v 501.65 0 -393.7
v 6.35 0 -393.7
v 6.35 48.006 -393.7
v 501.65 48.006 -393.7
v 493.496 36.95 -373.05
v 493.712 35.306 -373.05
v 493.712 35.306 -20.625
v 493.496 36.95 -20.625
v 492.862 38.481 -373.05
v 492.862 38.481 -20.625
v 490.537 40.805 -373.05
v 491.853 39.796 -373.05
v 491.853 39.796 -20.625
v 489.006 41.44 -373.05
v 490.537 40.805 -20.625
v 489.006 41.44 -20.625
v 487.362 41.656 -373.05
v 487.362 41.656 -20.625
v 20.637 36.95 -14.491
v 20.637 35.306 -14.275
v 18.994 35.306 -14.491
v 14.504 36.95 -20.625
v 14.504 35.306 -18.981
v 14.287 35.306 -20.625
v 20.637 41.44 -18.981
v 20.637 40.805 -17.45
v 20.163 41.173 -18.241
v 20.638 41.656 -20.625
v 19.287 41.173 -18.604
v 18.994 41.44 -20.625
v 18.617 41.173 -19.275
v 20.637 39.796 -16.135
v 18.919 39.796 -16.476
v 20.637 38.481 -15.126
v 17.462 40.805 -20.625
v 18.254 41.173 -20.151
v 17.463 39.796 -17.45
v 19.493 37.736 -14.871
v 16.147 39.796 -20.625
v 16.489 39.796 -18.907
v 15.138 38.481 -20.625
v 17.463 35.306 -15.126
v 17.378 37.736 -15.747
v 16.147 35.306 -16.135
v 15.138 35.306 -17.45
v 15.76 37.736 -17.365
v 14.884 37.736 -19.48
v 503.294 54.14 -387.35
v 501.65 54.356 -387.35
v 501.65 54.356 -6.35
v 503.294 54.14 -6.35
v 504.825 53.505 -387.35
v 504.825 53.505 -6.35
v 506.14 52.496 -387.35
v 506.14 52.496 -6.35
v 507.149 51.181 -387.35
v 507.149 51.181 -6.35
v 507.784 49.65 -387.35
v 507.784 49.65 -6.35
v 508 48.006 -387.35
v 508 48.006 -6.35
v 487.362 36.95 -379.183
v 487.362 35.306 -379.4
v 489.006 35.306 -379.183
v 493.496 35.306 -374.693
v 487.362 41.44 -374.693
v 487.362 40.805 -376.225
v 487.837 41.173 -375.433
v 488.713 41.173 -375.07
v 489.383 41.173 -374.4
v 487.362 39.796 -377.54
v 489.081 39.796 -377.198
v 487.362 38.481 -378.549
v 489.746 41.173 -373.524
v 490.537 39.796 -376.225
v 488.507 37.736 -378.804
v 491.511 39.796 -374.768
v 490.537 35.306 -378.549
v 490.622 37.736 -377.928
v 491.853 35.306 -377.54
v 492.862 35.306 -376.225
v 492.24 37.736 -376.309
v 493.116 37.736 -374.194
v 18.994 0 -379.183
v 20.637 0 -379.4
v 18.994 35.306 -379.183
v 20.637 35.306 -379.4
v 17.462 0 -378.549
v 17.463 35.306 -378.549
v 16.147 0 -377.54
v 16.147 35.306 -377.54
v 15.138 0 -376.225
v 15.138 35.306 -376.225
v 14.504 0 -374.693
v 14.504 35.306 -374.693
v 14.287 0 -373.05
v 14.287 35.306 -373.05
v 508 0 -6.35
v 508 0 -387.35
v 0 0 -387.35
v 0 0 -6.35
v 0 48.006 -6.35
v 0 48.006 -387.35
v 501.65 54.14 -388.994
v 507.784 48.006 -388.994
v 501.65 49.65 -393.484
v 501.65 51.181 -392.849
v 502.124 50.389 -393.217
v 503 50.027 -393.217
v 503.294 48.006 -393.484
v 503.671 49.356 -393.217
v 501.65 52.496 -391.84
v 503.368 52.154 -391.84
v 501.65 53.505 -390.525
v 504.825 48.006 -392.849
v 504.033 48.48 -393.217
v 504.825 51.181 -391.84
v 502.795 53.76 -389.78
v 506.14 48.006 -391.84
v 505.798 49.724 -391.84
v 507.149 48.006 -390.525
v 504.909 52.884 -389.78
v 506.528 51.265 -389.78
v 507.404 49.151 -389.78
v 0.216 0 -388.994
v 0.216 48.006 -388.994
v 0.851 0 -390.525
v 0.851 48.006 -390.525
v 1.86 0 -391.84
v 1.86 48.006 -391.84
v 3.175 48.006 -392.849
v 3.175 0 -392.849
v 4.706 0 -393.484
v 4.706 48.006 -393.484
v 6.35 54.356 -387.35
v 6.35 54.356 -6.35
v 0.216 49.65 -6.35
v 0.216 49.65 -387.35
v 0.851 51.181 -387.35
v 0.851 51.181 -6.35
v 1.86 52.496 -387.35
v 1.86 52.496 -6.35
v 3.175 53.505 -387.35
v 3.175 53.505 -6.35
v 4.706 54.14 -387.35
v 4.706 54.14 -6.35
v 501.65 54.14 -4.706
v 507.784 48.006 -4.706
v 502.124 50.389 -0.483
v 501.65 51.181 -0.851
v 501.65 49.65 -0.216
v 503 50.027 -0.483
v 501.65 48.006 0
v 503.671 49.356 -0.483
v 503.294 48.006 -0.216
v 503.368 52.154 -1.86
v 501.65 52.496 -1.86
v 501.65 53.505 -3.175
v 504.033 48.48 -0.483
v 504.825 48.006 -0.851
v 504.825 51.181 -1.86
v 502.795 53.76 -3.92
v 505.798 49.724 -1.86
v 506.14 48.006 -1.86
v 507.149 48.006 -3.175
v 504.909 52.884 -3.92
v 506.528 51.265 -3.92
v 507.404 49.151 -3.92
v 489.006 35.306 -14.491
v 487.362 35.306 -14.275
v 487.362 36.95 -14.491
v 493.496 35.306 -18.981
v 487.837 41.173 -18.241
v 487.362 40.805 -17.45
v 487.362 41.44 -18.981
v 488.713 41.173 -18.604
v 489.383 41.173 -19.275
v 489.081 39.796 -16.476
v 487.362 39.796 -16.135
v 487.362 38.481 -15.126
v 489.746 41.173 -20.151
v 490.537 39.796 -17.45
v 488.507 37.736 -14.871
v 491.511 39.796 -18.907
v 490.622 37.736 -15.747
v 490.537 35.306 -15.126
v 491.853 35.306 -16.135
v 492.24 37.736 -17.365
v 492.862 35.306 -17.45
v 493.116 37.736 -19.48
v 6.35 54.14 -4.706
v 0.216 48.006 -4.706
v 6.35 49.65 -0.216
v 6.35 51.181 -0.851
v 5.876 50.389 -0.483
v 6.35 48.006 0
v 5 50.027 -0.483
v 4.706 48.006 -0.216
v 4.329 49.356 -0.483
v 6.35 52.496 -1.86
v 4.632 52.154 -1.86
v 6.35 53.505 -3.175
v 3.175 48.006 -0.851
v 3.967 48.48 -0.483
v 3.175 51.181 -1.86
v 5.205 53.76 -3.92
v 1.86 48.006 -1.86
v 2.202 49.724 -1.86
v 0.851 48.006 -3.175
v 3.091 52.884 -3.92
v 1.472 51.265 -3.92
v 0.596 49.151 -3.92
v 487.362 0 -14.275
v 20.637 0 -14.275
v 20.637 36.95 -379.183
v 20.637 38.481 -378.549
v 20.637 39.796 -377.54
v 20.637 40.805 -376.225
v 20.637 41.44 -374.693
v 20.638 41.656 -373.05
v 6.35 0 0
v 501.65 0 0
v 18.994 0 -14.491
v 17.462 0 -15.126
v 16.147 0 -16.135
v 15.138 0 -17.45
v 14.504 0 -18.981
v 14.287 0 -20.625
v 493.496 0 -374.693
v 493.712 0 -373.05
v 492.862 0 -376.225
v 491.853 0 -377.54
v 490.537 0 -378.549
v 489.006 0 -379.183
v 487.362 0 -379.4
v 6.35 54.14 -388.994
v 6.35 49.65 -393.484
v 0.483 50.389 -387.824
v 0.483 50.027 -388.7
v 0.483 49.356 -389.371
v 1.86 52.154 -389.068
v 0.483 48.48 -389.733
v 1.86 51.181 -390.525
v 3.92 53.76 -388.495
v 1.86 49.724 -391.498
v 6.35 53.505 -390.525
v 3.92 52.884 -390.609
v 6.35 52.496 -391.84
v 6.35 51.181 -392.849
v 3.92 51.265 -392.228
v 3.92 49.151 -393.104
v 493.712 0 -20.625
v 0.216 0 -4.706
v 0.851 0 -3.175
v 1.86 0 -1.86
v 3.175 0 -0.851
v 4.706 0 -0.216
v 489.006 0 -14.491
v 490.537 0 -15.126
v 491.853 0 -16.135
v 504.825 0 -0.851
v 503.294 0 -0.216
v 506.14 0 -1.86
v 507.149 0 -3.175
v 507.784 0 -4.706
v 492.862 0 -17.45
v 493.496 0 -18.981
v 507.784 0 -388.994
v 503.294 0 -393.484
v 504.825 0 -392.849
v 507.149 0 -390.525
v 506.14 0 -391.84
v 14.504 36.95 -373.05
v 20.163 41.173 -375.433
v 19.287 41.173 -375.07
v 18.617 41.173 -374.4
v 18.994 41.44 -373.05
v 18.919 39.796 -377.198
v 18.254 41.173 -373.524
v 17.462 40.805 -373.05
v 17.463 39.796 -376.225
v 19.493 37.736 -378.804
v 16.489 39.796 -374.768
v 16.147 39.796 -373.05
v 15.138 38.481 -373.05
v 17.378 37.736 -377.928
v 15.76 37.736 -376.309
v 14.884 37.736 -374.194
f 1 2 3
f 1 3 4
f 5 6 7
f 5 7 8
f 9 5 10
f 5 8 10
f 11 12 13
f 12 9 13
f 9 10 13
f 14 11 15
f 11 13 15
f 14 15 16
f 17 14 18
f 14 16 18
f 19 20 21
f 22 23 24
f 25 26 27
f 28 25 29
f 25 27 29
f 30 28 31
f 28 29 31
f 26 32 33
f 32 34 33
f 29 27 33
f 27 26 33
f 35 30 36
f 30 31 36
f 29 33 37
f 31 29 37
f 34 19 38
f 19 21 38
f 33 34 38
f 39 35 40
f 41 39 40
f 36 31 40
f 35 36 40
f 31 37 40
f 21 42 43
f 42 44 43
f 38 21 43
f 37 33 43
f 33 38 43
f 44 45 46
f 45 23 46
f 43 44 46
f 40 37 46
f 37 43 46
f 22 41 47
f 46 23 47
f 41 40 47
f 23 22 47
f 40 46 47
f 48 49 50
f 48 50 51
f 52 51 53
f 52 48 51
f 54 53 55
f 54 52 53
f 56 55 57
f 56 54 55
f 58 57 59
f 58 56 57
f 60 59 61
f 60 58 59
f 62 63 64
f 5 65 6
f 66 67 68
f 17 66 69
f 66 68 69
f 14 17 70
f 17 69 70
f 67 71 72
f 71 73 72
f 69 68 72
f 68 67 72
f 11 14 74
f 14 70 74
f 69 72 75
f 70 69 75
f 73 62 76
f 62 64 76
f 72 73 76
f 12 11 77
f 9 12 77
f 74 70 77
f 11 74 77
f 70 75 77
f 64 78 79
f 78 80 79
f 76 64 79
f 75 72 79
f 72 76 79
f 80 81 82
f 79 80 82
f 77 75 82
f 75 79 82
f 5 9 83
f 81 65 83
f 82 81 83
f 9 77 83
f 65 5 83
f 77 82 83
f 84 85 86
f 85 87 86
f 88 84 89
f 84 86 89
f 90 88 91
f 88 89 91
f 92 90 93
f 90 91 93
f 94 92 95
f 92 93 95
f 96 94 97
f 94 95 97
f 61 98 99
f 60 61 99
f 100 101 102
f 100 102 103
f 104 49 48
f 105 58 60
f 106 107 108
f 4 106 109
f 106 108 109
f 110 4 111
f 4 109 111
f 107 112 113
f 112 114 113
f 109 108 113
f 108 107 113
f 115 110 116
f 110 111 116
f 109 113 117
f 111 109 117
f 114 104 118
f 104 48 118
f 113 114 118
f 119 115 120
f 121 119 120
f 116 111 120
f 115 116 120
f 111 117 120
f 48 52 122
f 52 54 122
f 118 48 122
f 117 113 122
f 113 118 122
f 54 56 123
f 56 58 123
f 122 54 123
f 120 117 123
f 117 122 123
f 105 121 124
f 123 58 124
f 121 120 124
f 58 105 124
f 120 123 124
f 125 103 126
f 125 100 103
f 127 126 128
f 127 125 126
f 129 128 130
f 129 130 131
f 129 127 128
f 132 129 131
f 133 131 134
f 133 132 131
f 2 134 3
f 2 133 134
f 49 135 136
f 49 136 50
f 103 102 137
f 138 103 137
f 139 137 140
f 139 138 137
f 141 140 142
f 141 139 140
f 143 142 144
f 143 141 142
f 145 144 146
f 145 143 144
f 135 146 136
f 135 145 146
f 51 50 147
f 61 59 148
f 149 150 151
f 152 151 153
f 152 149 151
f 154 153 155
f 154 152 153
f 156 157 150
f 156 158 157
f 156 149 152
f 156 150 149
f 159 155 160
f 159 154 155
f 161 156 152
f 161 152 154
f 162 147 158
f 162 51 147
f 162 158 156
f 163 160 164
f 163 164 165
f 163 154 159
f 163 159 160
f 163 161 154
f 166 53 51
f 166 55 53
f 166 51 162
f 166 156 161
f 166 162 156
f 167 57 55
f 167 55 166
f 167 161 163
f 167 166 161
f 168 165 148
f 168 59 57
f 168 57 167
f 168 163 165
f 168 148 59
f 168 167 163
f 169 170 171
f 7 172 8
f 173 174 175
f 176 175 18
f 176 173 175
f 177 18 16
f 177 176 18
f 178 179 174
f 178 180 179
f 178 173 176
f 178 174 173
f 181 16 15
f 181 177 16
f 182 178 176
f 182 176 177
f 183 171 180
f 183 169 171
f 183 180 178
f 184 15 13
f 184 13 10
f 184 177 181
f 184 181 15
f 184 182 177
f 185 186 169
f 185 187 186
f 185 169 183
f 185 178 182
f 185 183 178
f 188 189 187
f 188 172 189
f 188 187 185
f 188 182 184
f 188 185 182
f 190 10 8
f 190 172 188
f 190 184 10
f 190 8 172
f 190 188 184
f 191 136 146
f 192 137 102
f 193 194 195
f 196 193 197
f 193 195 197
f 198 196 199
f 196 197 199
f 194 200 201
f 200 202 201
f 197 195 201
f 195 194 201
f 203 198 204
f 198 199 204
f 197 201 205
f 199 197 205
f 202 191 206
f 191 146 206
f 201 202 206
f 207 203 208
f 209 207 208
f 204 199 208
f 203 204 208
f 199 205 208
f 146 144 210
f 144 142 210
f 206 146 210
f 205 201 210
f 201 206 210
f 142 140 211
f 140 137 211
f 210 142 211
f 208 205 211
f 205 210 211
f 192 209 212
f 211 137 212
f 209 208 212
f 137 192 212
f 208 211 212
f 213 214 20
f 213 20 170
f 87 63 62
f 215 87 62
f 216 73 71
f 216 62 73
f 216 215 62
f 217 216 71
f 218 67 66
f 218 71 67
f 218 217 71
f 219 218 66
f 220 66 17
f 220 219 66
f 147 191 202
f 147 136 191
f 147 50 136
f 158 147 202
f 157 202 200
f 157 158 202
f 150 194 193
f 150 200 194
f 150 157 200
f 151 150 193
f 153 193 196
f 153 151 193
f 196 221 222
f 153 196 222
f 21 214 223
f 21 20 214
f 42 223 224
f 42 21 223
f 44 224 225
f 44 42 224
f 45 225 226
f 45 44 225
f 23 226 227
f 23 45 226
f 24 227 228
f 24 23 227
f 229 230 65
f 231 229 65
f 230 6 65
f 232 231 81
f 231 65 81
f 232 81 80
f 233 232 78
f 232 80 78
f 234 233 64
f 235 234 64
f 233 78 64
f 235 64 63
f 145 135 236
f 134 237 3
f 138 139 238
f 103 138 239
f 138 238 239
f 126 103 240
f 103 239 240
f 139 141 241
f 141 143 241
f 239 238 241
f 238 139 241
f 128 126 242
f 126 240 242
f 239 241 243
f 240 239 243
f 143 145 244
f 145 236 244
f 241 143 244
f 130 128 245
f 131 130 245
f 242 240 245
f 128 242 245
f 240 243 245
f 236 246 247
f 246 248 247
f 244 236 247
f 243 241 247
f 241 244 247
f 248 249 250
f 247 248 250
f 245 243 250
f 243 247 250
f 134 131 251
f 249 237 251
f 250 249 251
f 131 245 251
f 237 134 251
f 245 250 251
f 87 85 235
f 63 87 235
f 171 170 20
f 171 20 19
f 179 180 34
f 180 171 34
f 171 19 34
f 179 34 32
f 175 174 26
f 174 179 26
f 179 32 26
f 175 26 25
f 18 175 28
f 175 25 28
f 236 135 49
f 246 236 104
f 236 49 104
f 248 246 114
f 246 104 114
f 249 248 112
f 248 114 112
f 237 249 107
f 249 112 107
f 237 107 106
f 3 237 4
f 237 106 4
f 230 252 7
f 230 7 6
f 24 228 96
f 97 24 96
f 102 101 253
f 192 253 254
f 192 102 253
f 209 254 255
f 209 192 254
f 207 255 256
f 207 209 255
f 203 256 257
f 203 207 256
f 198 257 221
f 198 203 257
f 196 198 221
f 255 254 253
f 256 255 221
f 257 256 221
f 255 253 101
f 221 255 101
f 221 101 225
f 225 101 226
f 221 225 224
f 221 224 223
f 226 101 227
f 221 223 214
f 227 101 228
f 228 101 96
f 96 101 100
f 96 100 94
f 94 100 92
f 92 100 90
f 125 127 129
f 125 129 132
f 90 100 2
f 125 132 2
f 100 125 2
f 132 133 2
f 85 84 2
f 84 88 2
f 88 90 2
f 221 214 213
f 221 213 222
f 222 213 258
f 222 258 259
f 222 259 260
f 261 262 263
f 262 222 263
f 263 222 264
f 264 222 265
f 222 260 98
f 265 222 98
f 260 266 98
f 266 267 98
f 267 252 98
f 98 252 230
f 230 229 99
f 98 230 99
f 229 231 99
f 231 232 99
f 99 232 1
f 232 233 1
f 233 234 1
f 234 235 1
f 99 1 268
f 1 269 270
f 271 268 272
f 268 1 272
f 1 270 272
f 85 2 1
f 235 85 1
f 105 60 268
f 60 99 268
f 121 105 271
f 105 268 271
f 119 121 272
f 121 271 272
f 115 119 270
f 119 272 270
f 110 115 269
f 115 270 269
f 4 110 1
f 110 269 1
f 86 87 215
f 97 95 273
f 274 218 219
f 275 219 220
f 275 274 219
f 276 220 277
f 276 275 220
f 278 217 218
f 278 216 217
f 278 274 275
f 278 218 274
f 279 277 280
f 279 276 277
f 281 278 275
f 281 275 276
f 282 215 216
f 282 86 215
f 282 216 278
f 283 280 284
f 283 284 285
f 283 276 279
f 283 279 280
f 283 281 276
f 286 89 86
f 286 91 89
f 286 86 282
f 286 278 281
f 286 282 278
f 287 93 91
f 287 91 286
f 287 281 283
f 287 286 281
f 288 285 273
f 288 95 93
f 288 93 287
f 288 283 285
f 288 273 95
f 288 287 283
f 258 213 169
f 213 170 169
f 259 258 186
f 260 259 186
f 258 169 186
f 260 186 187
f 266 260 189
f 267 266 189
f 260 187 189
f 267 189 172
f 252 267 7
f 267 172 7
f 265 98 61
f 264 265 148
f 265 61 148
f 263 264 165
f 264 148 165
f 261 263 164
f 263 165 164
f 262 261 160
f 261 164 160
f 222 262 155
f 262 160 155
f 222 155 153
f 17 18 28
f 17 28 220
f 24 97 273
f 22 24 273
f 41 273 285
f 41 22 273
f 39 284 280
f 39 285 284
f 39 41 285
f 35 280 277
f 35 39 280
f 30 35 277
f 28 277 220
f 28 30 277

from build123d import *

# Parameters (mm, degrees)
SKETCH1_W           = 508
SKETCH1_H           = 393.7
SKETCH1_W_2         = 479.425
SKETCH1_H_2         = 365.125
BOSS_EXTRUDE1_DEPTH = 54.356
SKETCH2_W           = 393.7
SKETCH2_H           = 12.7
BOSS_EXTRUDE2_DEPTH = 508
FILLET1_R           = 6.35
FILLET2_R           = 6.35


with BuildPart() as part:
    # Sketch1 → Boss-Extrude1 (new body)
    with BuildSketch(Plane(origin=(0, 0, 0), x_dir=(1, 0, 0), z_dir=(0, 1, 0))):
        with Locations((254, 196.85)):
            Rectangle(SKETCH1_W, SKETCH1_H)
        with Locations((254, 196.8373)):
            Rectangle(SKETCH1_W_2, SKETCH1_H_2, mode=Mode.SUBTRACT)
    extrude(amount=BOSS_EXTRUDE1_DEPTH)

    # Sketch2 → Boss-Extrude2 (add)
    with BuildSketch(Plane(origin=(508, 0, 0), x_dir=(0, 0, -1), z_dir=(1, 0, 0))):
        with Locations((196.85, 48.006)):
            Rectangle(SKETCH2_W, SKETCH2_H)
    extrude(amount=-BOSS_EXTRUDE2_DEPTH)

    # Fillet1
    fillet1_edges = [part.edges().sort_by_distance(p)[0] for p in [
        (508, 54.356, -196.85),
        (254, 54.356, -393.7),
        (0, 54.356, -196.85),
        (254, 54.356, 0),
        (0, 27.178, -393.7),
        (508, 27.178, -393.7),
        (508, 27.178, 0),
        (0, 27.178, 0),
    ]]
    fillet(fillet1_edges, radius=FILLET1_R)

    # Fillet2
    fillet2_edges = [part.edges().sort_by_distance(p)[0] for p in [
        (493.7125, 20.828, -379.3998),
        (14.2875, 20.828, -379.3998),
        (254, 41.656, -379.3998),
        (493.7125, 20.828, -14.2748),
        (14.2875, 20.828, -14.2748),
        (254, 41.656, -14.2748),
        (14.2875, 41.656, -196.8373),
        (493.7125, 41.656, -196.8373),
    ]]
    fillet(fillet2_edges, radius=FILLET2_R)


solid = part.part
